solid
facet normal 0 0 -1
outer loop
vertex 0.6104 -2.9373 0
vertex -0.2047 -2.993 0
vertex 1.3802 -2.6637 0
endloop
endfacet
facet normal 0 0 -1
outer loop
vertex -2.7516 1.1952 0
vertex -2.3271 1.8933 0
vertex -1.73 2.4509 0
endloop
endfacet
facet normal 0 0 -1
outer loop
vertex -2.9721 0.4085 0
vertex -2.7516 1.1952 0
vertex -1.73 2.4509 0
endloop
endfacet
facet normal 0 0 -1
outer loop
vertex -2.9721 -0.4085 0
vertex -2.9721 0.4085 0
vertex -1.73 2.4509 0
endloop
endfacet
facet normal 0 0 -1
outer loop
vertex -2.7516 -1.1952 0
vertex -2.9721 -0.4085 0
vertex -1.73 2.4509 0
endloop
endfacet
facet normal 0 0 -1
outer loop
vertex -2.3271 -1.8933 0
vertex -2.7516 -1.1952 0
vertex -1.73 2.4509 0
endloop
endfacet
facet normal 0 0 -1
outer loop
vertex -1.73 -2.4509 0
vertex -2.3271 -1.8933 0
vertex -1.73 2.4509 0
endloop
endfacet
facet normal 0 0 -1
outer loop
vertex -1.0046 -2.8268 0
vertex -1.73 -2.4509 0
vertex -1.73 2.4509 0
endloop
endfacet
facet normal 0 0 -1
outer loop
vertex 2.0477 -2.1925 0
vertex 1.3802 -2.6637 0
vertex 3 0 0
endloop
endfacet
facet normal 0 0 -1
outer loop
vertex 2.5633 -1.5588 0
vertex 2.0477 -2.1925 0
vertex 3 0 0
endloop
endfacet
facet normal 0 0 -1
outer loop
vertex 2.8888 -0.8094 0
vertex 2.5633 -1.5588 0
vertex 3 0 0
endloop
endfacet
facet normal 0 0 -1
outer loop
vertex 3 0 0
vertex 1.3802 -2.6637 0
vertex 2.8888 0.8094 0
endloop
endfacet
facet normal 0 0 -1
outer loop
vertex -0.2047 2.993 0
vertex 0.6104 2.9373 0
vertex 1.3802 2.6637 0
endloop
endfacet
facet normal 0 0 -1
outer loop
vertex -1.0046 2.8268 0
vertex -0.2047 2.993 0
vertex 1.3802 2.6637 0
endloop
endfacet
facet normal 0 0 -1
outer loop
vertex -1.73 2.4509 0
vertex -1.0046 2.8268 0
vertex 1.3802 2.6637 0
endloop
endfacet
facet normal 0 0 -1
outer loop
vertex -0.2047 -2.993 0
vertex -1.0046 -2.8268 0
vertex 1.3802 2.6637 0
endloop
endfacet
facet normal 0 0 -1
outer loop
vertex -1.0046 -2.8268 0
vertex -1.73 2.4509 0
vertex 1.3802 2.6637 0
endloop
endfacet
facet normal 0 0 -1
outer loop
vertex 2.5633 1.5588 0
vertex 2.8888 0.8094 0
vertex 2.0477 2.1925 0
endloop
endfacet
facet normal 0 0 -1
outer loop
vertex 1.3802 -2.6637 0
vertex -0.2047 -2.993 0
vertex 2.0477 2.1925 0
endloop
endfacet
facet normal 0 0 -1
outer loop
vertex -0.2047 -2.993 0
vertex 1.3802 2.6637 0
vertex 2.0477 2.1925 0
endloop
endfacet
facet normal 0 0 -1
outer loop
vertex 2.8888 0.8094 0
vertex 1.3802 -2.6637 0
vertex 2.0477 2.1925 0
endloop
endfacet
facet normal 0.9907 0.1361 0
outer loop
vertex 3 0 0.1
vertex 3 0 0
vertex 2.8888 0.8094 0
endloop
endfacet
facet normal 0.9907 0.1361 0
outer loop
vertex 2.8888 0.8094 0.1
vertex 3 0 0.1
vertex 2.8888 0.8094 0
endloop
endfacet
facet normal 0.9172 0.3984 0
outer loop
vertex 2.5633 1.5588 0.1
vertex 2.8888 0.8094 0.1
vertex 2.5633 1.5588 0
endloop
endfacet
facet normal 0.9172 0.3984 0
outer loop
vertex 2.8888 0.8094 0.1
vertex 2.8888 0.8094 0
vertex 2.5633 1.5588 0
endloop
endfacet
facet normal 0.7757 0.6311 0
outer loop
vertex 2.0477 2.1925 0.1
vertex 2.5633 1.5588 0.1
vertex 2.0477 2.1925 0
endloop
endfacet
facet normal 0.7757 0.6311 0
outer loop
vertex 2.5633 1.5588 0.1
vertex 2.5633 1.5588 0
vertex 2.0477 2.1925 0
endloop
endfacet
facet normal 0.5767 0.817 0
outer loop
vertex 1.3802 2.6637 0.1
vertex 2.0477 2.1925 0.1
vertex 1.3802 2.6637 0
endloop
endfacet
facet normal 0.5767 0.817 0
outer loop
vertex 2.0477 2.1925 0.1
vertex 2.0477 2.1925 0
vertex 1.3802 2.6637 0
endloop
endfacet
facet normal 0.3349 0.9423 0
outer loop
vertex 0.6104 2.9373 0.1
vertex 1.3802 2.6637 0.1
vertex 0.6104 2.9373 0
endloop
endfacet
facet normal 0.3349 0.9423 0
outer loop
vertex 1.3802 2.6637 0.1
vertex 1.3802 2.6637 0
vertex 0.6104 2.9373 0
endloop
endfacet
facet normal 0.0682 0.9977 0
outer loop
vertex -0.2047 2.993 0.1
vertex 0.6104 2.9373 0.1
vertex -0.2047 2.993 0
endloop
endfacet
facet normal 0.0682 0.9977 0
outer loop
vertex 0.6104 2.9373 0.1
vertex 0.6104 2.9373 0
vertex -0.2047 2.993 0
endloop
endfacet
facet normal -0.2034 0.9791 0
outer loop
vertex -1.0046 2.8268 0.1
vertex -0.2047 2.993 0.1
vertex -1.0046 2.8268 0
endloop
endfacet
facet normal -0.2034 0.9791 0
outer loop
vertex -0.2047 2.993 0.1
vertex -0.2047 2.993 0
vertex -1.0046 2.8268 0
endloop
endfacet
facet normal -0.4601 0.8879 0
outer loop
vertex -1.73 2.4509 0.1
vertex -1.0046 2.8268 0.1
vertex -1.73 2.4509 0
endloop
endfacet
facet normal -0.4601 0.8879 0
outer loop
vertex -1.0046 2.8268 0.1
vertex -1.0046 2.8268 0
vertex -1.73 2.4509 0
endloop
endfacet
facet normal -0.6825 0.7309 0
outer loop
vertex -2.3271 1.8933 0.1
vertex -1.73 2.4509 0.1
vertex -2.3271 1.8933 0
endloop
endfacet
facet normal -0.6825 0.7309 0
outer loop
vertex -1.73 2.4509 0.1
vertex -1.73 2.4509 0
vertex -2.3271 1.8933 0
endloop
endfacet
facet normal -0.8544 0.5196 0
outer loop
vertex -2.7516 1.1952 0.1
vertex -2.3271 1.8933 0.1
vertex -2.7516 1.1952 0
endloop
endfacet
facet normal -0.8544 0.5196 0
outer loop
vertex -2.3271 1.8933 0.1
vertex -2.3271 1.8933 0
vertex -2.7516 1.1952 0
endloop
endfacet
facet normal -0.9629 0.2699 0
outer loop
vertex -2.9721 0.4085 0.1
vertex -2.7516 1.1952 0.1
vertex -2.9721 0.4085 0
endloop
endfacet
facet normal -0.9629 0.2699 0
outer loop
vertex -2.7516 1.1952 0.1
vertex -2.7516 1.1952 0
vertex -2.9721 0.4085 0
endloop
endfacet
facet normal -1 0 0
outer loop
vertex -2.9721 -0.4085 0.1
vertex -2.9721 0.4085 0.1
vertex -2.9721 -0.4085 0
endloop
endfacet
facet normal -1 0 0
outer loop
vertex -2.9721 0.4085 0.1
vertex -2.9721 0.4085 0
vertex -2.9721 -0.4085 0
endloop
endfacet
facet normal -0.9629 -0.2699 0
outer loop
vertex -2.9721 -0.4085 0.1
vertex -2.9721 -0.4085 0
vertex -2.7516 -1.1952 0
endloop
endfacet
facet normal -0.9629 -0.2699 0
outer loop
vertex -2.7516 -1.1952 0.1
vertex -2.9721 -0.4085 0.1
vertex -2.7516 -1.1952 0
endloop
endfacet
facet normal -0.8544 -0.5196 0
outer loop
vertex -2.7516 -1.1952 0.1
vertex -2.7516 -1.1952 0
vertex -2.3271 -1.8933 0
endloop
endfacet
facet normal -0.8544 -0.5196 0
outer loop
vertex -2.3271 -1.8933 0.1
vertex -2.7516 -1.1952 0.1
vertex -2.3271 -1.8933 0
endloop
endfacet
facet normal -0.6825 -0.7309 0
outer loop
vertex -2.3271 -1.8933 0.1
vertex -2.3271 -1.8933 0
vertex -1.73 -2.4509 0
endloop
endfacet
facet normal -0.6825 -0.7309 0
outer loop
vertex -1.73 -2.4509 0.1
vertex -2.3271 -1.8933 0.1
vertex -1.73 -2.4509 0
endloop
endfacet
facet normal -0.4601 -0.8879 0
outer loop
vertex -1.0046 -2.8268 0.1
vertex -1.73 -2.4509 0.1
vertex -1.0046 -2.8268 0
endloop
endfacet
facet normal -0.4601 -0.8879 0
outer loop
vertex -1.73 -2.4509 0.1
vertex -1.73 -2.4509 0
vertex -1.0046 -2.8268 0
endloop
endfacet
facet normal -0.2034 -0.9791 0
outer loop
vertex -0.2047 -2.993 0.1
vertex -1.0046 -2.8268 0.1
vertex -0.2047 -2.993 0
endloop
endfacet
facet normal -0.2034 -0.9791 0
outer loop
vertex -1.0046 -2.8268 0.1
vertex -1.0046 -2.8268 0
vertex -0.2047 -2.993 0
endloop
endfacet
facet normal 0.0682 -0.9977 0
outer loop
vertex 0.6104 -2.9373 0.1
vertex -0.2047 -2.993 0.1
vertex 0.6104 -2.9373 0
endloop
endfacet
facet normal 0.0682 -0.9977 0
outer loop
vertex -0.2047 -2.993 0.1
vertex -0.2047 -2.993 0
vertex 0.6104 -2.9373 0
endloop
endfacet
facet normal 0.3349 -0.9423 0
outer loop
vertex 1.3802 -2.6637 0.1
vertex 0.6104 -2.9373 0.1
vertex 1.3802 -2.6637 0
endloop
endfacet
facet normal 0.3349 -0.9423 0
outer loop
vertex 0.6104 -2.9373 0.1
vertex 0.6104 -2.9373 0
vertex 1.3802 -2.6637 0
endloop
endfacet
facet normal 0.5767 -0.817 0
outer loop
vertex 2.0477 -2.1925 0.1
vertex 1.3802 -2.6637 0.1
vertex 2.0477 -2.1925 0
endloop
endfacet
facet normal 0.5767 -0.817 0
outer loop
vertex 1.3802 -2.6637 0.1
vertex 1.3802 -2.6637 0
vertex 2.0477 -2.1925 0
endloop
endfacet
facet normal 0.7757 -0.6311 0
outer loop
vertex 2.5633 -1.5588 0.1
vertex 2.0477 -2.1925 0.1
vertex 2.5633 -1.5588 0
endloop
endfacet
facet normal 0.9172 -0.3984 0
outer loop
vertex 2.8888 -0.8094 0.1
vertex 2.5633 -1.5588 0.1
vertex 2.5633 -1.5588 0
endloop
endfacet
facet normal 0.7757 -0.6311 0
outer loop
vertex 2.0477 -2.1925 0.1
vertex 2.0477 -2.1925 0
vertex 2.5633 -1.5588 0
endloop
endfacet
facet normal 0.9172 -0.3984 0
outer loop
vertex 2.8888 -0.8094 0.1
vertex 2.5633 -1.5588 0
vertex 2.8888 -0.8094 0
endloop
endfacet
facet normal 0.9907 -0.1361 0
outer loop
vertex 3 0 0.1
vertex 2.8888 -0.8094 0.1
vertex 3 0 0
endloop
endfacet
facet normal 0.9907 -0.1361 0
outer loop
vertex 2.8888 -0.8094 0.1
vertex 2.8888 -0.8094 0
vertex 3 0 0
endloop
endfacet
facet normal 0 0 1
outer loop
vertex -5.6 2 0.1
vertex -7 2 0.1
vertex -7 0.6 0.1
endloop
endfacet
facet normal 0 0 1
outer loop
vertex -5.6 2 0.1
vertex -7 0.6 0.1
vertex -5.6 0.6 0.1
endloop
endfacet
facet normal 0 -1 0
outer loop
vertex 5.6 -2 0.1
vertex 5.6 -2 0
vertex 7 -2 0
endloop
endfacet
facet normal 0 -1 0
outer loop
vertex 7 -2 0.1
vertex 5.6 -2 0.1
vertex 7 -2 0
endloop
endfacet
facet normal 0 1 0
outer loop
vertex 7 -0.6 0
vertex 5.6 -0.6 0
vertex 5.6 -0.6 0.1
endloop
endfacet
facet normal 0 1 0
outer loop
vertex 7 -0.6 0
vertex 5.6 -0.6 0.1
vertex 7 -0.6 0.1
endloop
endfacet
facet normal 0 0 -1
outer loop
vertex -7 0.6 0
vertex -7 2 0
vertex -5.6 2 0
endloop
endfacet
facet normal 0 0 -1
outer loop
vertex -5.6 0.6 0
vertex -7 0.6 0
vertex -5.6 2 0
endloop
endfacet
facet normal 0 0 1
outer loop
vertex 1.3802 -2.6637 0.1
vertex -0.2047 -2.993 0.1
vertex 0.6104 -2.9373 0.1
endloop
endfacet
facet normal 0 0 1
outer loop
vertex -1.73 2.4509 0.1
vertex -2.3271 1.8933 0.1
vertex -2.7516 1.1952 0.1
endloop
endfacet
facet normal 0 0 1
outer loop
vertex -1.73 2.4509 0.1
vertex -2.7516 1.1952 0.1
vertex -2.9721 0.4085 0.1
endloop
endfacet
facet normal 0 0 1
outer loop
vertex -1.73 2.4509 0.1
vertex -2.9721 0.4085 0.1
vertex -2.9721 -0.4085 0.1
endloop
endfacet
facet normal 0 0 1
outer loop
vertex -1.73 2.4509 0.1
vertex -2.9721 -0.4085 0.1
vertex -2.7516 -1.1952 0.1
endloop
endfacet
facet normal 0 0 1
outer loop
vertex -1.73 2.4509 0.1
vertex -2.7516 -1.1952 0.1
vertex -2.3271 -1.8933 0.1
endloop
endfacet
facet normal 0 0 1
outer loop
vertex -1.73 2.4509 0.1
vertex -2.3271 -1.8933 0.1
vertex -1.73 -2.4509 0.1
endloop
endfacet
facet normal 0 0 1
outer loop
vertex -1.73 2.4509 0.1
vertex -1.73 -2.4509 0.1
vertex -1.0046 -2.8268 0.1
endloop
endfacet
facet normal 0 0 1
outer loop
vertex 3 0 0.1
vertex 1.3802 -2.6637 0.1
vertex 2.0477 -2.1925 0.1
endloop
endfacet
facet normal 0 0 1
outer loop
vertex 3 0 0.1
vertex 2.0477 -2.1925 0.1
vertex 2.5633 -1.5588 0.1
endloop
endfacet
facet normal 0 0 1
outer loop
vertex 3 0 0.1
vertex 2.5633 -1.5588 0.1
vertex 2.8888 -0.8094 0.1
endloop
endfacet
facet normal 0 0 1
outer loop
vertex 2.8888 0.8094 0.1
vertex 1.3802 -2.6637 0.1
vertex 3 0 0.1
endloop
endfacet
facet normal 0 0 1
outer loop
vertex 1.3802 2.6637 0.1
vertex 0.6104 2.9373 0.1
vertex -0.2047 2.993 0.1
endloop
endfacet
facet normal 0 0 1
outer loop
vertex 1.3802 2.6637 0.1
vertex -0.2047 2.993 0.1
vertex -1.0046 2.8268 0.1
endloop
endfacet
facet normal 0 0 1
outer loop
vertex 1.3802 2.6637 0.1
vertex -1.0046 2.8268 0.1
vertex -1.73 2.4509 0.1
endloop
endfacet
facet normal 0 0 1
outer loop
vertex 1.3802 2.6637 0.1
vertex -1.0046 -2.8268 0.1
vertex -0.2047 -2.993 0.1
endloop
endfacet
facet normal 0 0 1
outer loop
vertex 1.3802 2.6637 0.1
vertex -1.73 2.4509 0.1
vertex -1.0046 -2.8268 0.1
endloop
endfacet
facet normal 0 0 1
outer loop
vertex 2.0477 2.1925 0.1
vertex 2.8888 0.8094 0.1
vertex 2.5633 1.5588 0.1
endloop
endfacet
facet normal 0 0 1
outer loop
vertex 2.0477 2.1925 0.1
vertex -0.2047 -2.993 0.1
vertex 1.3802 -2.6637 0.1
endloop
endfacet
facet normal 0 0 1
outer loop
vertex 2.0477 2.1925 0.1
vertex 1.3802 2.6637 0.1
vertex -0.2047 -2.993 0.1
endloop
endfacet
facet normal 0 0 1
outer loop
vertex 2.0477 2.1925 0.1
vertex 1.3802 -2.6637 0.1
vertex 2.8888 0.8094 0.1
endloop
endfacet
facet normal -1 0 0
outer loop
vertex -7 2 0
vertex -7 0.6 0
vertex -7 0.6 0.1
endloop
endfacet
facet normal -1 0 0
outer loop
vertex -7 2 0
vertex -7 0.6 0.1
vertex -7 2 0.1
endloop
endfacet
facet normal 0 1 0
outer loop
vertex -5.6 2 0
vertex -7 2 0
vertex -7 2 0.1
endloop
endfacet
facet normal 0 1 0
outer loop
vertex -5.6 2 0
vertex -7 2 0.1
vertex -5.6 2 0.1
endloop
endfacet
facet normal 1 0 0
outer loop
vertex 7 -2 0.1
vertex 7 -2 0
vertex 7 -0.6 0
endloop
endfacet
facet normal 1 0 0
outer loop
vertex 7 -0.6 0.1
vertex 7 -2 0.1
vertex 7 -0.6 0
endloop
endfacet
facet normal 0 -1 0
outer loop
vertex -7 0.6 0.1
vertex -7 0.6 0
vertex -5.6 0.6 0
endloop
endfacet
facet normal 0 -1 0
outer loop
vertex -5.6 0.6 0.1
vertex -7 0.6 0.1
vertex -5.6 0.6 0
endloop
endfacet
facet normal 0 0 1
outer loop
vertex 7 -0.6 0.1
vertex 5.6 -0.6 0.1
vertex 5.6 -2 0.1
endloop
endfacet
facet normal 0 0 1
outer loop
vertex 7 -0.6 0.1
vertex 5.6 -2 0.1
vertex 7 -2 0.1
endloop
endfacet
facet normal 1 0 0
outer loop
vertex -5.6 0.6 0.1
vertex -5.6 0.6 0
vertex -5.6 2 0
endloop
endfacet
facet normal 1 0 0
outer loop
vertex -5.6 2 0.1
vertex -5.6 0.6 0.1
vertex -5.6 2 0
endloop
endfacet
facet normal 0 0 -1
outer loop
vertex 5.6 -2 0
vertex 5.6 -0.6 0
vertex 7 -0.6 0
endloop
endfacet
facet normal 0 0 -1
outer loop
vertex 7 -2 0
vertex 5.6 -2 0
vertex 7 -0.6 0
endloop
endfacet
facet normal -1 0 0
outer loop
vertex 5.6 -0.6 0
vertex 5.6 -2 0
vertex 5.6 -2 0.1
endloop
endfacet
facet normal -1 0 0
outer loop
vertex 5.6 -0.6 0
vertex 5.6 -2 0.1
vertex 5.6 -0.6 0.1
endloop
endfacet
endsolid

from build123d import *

# Parameters (mm, degrees)
F0_R     = 3
F0_W     = 1.4
F0_H     = 1.4
F1_DEPTH = 0.1


with BuildPart() as f1:
    # F0 (on Top) → F1 (new body)
    with BuildSketch(Plane.XY):
        Circle(F0_R)
        with Locations((6.3, -1.3)):
            Rectangle(F0_W, F0_H)
        with Locations((-6.3, 1.3)):
            Rectangle(F0_W, F0_H)
    extrude(amount=F1_DEPTH)


solid = f1.part
